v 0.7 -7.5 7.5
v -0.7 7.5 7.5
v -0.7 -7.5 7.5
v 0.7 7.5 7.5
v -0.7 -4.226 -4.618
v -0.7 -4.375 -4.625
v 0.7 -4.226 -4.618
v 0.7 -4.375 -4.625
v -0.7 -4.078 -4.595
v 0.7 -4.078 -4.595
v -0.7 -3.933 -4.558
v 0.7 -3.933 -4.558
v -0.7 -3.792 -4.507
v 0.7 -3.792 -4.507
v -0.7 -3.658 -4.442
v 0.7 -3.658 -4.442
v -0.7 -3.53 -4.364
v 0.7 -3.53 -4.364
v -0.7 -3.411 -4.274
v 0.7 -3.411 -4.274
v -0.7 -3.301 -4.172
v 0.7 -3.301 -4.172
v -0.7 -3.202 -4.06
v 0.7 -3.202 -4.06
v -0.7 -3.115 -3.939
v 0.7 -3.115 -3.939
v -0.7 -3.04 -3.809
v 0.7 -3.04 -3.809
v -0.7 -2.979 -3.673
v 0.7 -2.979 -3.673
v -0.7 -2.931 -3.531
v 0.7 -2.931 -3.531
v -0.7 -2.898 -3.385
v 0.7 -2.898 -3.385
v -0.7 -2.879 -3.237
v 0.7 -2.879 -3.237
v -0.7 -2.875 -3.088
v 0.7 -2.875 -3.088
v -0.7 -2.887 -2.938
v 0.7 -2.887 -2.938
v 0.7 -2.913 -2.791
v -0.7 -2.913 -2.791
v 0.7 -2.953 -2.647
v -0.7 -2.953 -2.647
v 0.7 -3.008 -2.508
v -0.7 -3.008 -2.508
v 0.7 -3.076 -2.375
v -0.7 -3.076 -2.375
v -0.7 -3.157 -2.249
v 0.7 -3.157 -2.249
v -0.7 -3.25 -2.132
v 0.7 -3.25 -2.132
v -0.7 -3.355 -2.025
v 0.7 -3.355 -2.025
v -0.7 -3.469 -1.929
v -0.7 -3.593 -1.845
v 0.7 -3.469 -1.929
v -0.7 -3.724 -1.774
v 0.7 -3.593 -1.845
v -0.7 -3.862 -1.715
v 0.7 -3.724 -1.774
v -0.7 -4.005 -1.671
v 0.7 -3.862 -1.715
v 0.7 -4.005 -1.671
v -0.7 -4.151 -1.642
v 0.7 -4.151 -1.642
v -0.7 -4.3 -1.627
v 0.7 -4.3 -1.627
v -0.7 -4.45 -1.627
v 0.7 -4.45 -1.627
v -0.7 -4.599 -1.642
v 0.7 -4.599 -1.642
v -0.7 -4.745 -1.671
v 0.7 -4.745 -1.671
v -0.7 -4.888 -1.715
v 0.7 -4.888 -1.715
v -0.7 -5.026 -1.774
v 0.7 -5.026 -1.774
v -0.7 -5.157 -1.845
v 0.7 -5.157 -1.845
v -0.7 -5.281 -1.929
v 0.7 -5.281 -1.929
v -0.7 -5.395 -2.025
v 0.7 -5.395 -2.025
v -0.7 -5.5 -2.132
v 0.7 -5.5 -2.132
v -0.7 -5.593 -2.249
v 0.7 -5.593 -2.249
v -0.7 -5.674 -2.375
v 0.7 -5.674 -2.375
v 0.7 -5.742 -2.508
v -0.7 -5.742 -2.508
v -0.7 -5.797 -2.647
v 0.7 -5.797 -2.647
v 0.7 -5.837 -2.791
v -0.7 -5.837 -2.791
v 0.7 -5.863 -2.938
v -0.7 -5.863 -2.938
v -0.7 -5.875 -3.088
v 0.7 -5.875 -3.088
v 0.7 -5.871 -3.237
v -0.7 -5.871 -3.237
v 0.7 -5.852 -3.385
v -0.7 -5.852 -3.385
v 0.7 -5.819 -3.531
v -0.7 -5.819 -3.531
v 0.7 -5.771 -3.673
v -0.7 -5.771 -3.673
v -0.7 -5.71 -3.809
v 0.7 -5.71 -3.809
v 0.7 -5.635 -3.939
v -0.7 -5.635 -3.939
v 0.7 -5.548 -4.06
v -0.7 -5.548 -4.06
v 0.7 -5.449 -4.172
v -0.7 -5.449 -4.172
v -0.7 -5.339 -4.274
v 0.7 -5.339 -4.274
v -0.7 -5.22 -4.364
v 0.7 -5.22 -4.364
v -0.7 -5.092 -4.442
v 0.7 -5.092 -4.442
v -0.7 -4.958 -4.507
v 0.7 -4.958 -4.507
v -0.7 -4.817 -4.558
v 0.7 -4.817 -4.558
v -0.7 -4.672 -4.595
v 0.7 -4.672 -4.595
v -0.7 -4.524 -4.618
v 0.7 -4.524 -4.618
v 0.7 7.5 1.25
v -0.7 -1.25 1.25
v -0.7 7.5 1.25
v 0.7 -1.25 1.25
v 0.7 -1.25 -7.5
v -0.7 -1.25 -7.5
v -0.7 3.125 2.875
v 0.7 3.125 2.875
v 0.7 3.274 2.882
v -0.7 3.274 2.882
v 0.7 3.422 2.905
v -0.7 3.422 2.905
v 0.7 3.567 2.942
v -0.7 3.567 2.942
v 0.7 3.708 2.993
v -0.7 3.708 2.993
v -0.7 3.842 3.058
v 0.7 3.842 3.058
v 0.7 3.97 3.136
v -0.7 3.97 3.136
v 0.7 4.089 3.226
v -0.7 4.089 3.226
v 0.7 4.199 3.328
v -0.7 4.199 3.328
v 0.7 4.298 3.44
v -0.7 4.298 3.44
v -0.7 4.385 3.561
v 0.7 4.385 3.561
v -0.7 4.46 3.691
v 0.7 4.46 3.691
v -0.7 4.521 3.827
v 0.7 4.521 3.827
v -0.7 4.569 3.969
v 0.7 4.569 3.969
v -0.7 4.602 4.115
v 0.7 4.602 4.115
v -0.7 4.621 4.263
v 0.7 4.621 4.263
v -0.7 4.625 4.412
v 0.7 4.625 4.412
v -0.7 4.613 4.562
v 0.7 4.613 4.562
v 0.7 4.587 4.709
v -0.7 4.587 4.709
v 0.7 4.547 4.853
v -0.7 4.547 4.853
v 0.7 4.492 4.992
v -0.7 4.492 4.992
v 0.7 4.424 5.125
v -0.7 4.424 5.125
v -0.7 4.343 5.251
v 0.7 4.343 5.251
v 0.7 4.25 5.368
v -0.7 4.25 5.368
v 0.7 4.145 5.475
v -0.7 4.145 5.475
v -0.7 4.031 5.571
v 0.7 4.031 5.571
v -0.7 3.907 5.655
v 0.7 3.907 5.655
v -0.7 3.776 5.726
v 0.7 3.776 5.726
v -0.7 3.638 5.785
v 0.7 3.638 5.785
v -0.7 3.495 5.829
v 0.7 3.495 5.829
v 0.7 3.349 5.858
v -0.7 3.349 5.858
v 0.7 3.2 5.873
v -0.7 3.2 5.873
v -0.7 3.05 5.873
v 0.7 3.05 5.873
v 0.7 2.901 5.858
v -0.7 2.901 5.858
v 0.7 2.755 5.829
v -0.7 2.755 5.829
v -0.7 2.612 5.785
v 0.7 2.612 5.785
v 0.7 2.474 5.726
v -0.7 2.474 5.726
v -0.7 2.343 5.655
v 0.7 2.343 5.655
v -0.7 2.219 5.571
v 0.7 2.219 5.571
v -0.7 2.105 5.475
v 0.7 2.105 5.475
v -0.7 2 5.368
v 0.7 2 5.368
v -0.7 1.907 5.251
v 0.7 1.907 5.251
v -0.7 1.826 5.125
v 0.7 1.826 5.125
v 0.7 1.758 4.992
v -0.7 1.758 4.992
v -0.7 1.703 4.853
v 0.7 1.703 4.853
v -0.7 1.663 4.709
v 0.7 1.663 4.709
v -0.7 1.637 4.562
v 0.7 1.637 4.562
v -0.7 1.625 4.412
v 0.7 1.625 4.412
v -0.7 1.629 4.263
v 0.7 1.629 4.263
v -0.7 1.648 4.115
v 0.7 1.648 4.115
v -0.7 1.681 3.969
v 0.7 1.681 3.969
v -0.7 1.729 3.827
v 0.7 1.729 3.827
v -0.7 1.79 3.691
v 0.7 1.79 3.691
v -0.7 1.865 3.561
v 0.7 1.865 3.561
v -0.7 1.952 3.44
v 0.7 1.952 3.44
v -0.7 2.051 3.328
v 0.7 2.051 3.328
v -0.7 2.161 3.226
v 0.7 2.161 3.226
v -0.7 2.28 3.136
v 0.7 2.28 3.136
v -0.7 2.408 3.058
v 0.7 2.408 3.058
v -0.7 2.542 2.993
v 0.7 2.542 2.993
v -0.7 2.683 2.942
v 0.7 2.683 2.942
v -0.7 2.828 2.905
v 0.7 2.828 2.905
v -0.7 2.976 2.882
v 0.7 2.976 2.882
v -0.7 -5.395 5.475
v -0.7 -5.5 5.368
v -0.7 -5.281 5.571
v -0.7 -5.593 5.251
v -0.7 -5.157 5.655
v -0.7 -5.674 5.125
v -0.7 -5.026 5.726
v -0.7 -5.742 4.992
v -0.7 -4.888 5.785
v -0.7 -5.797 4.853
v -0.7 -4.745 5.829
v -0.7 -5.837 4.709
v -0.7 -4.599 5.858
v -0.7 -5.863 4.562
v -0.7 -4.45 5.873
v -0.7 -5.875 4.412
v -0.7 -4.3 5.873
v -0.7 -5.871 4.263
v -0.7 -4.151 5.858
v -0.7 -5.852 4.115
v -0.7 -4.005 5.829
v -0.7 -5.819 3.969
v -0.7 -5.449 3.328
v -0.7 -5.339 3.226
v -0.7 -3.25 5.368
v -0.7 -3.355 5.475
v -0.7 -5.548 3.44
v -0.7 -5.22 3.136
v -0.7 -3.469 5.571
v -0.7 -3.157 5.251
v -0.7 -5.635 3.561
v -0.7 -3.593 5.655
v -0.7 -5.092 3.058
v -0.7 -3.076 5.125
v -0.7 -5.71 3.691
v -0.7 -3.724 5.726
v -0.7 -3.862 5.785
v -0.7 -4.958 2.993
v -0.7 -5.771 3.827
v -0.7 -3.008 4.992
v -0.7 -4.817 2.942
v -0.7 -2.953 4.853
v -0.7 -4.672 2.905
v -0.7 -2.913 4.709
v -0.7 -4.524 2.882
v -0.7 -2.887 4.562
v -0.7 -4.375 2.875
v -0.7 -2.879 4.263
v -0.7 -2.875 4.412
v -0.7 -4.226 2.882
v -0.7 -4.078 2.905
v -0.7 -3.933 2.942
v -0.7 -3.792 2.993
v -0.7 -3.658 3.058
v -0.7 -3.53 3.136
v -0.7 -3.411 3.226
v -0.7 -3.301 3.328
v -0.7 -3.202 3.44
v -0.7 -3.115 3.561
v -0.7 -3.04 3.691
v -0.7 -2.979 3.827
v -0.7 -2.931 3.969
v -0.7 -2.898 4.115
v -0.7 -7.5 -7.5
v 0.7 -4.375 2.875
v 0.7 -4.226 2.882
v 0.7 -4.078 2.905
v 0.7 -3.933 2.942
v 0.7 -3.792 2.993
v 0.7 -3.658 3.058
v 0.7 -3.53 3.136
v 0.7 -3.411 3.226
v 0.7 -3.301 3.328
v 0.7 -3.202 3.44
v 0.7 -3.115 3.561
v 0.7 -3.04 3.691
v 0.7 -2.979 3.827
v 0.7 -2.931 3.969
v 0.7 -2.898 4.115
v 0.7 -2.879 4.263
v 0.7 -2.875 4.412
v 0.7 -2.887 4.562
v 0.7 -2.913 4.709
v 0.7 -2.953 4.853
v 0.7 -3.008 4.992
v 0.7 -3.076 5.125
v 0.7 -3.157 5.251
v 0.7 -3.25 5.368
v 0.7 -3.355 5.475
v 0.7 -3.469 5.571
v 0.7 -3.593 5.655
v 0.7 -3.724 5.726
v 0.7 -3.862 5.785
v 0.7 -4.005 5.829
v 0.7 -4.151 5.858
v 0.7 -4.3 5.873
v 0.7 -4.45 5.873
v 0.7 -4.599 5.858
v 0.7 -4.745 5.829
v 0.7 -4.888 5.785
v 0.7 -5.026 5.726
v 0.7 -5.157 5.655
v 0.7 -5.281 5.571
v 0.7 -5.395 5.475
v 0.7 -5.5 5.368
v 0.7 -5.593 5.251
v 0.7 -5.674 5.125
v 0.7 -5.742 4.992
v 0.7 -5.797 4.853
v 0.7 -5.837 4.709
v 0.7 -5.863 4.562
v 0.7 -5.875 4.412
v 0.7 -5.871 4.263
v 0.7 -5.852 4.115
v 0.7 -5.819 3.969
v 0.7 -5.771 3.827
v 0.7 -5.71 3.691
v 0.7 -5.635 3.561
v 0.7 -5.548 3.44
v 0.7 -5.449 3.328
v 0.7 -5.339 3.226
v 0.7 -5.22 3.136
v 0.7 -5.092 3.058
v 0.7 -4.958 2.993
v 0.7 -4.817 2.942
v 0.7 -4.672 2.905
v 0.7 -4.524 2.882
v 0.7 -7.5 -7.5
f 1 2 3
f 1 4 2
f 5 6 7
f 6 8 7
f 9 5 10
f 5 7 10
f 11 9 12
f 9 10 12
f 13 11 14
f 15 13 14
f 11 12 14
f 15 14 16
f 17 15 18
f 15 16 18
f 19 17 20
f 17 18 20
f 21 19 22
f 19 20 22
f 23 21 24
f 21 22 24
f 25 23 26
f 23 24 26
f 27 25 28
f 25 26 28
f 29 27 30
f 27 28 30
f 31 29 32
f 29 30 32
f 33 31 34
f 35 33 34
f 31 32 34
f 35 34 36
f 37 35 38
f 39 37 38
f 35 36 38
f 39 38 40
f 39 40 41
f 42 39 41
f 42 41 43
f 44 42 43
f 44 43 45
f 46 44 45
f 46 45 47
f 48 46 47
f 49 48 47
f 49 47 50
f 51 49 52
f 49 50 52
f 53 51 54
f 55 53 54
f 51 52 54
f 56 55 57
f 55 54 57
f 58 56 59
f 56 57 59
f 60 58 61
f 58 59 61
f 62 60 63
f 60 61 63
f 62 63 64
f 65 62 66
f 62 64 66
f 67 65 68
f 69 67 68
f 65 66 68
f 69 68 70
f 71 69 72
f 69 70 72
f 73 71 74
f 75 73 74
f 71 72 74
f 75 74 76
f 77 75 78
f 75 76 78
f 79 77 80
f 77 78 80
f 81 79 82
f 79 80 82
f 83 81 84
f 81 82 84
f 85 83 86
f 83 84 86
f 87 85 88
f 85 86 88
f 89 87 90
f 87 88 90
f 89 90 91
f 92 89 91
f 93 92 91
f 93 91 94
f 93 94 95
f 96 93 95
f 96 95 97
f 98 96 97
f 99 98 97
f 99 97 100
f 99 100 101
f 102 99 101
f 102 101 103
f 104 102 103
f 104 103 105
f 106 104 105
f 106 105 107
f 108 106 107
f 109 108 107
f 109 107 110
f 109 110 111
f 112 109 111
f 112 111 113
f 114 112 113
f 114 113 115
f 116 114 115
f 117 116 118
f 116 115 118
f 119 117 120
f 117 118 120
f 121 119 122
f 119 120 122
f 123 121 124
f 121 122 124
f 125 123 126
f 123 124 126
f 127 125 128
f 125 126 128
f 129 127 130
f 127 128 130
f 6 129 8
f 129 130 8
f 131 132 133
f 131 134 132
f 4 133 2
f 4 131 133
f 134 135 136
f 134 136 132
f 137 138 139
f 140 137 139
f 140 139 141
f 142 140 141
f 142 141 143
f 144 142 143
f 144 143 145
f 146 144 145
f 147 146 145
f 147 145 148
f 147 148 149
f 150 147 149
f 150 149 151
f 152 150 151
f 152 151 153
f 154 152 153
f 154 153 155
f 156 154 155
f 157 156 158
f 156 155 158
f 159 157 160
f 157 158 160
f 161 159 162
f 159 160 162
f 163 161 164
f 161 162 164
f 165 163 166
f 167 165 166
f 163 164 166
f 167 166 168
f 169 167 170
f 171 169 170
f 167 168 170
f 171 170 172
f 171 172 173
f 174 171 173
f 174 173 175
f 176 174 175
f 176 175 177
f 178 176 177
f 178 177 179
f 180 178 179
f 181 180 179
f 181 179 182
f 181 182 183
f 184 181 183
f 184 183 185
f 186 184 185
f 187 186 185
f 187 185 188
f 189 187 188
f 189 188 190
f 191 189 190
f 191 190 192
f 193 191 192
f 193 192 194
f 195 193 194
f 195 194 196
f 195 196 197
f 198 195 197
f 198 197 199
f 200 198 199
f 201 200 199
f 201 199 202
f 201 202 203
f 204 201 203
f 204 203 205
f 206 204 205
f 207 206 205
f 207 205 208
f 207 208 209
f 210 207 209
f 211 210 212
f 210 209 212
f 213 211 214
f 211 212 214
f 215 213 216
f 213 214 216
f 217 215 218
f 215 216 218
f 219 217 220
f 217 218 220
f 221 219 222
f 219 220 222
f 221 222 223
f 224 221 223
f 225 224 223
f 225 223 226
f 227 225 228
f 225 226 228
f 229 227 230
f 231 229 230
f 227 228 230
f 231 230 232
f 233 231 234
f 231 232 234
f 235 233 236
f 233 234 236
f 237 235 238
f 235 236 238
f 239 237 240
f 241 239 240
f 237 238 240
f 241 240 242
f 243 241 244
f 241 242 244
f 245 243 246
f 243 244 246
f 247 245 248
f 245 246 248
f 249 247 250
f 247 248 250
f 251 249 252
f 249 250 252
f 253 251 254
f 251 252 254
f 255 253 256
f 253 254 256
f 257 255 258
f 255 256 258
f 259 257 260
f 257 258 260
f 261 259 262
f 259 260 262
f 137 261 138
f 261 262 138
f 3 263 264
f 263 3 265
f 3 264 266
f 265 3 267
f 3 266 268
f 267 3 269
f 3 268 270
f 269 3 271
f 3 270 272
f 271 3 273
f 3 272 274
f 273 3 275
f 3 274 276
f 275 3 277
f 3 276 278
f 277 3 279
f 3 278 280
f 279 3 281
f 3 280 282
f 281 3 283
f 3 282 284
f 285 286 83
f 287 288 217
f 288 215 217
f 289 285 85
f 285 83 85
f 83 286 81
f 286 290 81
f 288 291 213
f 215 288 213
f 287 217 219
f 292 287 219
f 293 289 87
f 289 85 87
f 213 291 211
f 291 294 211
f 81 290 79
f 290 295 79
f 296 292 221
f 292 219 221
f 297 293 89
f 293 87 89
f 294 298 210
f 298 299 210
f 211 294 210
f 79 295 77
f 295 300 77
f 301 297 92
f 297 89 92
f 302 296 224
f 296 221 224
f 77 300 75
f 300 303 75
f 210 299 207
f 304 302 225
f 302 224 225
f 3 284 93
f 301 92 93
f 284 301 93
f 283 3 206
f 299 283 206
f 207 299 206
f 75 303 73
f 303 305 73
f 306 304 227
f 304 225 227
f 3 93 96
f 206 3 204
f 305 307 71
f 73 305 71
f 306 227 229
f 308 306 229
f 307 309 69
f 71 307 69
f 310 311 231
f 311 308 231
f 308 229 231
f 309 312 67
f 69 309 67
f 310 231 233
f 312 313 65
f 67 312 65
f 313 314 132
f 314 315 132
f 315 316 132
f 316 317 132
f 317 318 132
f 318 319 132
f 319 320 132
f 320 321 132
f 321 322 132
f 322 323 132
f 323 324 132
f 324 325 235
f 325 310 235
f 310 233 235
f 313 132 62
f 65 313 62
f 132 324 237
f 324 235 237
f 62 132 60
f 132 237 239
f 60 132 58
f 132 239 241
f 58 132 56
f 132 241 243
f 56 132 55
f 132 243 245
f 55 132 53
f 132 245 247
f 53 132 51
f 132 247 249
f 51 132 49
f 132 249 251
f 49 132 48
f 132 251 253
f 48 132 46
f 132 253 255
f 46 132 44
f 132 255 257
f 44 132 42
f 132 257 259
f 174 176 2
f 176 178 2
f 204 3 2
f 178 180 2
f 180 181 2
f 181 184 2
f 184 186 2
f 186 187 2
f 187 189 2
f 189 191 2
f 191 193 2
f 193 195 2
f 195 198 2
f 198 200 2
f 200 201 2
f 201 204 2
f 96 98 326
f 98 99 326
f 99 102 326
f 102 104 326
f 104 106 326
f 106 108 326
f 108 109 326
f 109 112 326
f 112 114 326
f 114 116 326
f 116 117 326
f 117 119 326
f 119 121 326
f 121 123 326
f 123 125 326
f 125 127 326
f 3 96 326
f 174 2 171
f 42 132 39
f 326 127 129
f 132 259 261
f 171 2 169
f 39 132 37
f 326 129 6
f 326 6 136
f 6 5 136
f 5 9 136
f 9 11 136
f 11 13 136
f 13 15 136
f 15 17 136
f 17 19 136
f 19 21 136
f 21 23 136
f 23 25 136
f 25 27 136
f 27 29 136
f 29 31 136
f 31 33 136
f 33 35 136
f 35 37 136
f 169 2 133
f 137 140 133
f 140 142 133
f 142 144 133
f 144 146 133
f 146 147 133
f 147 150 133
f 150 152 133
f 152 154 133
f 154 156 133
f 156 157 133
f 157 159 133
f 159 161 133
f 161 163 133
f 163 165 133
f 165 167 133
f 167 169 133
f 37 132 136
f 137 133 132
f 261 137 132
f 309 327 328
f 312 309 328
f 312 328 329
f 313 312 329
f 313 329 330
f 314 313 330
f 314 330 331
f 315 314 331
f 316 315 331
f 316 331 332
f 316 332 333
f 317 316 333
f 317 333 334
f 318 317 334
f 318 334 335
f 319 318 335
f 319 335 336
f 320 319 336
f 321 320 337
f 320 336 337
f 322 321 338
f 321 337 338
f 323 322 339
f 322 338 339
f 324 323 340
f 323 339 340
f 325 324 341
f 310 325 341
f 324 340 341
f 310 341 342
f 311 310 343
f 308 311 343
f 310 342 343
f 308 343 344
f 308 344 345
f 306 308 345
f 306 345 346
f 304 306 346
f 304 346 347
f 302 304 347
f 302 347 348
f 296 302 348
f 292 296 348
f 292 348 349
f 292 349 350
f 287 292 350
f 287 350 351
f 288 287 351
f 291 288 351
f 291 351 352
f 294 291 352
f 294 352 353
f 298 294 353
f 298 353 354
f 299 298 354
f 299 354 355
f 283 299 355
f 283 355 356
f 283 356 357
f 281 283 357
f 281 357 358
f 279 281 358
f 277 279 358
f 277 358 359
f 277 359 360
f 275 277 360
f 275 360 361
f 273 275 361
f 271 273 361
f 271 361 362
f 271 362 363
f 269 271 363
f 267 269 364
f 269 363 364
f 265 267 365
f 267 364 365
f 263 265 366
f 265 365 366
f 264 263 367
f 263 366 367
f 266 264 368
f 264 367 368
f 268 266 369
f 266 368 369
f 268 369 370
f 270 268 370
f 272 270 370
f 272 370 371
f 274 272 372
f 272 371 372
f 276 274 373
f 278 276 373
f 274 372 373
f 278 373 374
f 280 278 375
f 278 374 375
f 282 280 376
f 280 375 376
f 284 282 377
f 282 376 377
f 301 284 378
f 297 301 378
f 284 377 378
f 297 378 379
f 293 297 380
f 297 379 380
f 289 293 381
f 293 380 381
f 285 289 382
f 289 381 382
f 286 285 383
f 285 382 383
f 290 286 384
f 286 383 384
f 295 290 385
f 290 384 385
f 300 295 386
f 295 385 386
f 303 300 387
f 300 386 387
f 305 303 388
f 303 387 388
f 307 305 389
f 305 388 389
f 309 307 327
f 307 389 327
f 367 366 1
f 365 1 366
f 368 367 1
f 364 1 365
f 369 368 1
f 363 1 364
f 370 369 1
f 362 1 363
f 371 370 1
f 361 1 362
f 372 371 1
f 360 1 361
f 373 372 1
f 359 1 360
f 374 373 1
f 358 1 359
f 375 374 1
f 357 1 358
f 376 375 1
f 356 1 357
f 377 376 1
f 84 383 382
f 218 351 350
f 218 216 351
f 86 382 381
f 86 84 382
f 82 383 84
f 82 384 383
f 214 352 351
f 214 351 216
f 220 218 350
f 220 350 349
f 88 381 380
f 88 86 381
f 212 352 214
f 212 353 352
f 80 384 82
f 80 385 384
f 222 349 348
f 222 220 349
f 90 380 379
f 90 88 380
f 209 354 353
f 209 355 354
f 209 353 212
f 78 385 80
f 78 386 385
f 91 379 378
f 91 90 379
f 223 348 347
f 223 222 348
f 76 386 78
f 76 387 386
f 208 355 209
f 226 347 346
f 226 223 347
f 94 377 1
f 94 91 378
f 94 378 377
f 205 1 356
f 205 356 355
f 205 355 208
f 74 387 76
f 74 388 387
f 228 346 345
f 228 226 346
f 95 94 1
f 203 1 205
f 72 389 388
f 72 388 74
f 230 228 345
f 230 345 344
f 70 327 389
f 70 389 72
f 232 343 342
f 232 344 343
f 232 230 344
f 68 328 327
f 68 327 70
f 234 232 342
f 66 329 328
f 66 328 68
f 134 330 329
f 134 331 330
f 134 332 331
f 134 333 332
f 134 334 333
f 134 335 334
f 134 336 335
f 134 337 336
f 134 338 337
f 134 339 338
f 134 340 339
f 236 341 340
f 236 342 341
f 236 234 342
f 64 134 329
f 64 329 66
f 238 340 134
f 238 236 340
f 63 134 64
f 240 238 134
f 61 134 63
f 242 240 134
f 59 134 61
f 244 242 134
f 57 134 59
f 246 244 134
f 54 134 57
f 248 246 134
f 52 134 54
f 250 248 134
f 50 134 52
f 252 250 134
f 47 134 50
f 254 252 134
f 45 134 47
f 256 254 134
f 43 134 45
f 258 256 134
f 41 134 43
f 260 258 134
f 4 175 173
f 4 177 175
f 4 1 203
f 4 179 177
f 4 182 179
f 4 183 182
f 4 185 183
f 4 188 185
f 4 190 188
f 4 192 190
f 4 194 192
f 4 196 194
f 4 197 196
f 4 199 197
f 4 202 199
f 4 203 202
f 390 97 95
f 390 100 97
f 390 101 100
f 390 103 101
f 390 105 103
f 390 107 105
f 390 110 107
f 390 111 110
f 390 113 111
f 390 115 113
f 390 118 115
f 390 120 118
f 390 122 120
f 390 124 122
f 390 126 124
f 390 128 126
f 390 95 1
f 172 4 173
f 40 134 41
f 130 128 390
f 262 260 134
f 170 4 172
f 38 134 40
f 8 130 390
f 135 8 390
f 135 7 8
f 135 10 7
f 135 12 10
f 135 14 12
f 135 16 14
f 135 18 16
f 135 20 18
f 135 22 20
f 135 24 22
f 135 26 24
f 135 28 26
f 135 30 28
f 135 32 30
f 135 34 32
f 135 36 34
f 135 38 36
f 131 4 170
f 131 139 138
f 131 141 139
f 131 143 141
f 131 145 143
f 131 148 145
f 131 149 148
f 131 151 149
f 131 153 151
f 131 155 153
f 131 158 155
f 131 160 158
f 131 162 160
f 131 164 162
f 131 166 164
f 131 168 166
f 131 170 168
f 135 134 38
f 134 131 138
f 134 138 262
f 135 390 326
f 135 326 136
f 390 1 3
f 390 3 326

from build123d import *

# Parameters (mm, degrees)
SALIENTE_EXTRUIR1_DEPTH = 0.7
CROQUIS2_R              = 1.5
CORTAR_EXTRUIR1_DEPTH   = 10


with BuildPart() as part:
    # Croquis1 → Saliente-Extruir1 (new, symmetric)
    with BuildSketch(Plane(origin=(0, 0, 0), x_dir=(0, 0, -1), z_dir=(1, 0, 0))):
        Polygon((-7.5, 7.5), (-7.5, -7.5), (7.5, -7.5), (7.5, -1.25), (-1.25, -1.25), (-1.25, 7.5), align=None)
    extrude(amount=SALIENTE_EXTRUIR1_DEPTH, both=True)

    # Croquis2 → Cortar-Extruir1 (cut, symmetric)
    with BuildSketch(Plane(origin=(0.7, 0, 0), x_dir=(0, 0, -1), z_dir=(1, 0, 0))):
        with Locations((-4.375, -4.375)):
            Circle(CROQUIS2_R)
        with Locations((-4.375, 3.125)):
            Circle(CROQUIS2_R)
        with Locations((3.125, -4.375)):
            Circle(CROQUIS2_R)
    extrude(amount=CORTAR_EXTRUIR1_DEPTH, both=True, mode=Mode.SUBTRACT)


solid = part.part
